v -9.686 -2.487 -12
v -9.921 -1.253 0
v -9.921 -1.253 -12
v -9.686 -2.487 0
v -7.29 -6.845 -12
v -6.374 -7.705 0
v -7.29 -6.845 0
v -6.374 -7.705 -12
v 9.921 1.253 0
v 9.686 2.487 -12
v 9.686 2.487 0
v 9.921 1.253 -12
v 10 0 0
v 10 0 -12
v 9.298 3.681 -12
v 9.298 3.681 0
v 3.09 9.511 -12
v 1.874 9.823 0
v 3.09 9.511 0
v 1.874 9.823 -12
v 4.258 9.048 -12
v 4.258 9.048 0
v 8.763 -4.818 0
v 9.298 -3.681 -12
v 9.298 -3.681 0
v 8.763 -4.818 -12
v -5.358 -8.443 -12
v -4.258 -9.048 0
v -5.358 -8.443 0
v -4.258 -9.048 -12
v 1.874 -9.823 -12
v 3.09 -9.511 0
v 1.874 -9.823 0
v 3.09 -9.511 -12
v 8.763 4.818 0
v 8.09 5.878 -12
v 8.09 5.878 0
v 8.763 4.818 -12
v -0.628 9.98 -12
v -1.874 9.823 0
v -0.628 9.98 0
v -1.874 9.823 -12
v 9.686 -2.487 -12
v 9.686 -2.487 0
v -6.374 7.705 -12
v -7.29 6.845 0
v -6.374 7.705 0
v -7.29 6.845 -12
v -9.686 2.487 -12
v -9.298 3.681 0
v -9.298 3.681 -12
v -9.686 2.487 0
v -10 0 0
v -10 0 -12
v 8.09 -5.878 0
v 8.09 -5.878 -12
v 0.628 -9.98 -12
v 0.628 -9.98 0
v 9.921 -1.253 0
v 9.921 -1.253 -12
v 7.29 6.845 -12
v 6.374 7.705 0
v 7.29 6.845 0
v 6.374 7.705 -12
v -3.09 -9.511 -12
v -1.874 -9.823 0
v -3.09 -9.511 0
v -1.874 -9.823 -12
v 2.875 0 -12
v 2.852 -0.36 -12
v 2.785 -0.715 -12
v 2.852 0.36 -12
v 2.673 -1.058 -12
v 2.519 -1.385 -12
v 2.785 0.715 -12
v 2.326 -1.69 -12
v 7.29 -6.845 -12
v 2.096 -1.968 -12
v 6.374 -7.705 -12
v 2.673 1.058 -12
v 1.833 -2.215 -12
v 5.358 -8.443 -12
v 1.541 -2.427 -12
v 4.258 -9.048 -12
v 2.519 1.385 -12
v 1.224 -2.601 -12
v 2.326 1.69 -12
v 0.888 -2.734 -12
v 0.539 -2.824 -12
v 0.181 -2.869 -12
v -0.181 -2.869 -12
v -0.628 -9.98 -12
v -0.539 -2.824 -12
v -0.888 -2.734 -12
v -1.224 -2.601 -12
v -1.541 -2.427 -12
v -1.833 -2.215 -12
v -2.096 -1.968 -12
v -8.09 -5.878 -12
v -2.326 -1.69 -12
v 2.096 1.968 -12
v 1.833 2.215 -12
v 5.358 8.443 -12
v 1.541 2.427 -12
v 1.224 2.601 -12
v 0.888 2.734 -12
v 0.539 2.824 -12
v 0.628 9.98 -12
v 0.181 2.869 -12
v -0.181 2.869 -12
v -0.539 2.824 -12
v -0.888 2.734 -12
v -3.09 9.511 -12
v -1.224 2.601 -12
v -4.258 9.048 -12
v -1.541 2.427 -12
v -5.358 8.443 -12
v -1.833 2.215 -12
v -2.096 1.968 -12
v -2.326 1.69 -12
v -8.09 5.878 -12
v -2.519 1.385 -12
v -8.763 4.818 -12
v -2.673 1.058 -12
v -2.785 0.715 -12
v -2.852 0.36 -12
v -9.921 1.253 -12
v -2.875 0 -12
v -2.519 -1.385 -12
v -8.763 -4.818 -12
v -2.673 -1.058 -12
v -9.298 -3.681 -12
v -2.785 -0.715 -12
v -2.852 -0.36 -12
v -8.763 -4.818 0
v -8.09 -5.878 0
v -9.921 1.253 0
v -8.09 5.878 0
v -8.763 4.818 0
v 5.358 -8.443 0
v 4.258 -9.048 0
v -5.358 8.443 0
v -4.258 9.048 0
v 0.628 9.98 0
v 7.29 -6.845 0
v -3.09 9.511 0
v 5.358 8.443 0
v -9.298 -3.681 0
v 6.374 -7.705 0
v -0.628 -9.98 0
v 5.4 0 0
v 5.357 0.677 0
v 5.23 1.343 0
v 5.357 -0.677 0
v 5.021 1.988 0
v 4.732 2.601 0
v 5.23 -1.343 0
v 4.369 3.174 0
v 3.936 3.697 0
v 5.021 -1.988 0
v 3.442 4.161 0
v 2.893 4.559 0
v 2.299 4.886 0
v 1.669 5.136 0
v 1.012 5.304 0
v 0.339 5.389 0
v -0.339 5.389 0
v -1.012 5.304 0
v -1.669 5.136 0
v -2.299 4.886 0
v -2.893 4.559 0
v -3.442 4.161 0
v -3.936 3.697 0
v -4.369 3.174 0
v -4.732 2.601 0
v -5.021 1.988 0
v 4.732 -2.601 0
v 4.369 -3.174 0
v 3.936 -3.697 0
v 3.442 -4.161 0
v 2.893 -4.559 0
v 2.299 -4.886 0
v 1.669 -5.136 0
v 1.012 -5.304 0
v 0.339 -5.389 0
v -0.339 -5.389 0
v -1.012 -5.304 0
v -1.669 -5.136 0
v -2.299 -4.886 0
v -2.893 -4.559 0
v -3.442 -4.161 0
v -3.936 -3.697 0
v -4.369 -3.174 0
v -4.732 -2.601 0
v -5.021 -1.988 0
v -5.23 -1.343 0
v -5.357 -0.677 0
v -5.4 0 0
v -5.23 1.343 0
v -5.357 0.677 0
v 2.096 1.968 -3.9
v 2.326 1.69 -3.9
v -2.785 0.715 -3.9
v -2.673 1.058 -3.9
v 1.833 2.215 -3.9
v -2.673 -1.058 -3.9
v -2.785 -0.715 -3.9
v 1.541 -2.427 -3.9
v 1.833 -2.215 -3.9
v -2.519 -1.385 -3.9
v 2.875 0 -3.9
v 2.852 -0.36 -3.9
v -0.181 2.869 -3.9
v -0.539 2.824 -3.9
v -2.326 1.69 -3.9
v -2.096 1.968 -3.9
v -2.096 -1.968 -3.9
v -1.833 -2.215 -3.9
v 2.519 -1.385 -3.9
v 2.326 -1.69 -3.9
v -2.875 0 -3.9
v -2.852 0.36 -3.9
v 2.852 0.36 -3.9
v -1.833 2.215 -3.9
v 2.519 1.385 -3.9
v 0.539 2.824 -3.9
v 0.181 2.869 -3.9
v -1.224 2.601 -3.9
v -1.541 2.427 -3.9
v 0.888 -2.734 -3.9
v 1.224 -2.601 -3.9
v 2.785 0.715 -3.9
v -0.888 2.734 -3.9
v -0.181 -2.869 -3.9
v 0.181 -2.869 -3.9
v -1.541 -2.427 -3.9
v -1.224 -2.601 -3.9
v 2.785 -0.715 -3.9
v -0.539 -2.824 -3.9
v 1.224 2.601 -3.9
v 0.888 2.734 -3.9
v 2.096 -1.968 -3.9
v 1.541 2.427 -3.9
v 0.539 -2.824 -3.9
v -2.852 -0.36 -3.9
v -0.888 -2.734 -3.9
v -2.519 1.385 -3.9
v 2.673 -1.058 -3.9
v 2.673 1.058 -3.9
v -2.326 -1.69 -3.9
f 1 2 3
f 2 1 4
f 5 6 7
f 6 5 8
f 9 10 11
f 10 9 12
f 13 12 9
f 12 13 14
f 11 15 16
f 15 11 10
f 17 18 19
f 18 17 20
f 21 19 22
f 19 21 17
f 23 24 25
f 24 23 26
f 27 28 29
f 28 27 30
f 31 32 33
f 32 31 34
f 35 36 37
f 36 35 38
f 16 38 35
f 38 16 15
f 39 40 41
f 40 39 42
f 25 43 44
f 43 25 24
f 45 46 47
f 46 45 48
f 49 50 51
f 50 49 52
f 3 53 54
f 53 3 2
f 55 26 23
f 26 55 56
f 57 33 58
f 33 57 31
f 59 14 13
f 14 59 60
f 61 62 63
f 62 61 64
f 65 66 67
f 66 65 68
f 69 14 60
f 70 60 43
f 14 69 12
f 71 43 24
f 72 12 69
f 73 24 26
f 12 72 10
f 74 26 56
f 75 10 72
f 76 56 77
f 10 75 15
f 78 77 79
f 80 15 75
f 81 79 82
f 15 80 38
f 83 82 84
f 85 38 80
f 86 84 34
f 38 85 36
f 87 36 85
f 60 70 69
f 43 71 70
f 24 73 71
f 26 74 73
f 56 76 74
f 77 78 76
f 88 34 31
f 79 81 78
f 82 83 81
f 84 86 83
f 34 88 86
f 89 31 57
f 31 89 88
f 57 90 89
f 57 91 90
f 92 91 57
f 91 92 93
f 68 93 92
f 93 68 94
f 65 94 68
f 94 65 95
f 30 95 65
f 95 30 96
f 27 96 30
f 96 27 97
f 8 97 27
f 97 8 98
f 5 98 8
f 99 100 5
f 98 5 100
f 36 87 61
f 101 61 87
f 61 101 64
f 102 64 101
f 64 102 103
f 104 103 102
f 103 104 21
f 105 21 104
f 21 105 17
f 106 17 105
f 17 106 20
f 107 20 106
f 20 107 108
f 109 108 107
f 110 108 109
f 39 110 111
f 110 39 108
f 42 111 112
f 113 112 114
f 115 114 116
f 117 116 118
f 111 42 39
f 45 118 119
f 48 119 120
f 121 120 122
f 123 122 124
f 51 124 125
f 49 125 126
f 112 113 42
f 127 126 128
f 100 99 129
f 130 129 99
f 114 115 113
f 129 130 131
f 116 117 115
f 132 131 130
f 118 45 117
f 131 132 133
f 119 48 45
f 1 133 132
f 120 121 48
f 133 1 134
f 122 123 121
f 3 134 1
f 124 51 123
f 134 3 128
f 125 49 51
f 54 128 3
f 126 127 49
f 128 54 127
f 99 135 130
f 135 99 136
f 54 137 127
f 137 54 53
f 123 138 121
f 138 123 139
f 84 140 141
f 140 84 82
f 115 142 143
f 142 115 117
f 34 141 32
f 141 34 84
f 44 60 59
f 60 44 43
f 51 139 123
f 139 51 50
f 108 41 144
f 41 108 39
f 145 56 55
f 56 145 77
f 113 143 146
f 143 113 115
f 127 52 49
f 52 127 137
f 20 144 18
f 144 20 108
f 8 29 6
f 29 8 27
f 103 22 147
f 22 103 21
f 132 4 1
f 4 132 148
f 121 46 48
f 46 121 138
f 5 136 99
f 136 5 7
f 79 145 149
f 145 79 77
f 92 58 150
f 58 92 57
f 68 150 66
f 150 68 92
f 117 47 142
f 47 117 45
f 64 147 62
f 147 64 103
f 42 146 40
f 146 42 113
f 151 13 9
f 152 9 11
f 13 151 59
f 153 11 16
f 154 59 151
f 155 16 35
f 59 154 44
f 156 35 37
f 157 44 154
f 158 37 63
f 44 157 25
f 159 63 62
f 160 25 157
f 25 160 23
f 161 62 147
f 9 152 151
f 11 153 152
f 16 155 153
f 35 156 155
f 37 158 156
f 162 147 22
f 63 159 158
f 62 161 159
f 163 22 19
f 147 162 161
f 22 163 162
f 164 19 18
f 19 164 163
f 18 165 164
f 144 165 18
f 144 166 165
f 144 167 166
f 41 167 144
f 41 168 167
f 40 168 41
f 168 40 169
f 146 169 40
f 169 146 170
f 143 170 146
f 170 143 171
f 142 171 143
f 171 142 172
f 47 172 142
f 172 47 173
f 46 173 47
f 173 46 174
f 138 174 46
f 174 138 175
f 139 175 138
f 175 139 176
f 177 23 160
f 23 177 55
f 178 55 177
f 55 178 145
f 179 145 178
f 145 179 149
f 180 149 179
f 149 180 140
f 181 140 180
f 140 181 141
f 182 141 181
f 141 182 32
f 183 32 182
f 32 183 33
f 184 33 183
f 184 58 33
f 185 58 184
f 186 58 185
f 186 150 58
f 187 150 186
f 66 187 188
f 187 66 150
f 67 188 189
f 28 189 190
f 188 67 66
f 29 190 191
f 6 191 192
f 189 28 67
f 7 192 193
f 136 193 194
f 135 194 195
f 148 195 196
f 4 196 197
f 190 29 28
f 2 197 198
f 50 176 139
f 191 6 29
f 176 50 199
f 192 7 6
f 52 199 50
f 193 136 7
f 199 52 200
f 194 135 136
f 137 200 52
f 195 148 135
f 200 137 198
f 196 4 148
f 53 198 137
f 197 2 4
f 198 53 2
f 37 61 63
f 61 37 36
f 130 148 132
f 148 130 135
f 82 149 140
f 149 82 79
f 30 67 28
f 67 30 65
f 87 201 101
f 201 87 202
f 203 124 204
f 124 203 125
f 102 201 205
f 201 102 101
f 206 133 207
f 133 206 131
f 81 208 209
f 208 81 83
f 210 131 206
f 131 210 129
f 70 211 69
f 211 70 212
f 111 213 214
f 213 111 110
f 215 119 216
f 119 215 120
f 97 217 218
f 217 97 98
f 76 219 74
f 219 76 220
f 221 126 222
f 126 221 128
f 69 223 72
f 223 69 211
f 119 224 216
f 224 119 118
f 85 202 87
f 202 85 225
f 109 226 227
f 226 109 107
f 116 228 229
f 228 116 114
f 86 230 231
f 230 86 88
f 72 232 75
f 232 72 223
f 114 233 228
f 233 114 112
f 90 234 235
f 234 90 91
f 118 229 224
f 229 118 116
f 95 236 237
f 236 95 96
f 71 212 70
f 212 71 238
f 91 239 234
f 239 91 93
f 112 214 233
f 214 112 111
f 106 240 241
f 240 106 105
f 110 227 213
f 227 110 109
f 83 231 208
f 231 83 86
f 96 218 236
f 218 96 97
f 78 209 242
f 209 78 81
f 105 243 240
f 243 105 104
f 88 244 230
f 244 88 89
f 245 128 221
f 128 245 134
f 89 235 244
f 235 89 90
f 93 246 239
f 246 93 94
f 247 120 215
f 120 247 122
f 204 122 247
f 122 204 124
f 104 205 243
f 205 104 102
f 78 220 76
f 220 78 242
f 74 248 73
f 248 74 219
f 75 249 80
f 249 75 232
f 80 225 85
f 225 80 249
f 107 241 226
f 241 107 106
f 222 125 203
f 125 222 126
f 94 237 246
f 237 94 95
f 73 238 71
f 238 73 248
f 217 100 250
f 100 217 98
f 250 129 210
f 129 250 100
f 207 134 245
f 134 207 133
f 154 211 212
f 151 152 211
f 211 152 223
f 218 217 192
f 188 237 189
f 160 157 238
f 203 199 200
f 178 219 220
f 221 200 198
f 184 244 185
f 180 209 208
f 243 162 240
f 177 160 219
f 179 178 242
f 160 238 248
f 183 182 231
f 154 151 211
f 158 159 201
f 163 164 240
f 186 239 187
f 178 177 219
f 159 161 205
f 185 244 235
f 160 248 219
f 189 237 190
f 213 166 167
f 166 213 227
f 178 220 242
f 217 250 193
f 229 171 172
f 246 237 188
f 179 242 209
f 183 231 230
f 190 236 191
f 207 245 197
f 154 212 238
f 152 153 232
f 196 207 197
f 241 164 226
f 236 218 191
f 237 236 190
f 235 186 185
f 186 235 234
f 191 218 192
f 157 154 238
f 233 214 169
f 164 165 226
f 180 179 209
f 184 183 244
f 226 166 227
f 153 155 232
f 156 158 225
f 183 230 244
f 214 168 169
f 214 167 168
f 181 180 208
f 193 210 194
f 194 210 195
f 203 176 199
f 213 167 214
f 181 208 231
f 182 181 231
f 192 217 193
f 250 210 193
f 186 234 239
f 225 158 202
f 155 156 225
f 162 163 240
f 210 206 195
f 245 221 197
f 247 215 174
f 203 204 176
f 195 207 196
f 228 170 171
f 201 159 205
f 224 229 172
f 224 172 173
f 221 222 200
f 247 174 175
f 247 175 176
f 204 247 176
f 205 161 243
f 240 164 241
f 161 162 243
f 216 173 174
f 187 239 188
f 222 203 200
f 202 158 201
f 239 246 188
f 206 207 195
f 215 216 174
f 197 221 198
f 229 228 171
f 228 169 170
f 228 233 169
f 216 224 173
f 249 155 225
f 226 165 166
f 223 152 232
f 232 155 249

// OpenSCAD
$fn = 50;

difference() {
	union() {
		translate(v = [0, 0, -12.0]) {
			cylinder(h = 12, r = 10.0);
		}
		#translate(v = [0, 0, -15.0]) {
			cylinder(h = 15, r = 2.875);
		}
	}
	union() {
		translate(v = [0, 0, 0]) {
			rotate(a = [0, 0, 0]) {
				difference() {
					union() {
						translate(v = [0, 0, -15.0]) {
							cylinder(h = 15, r = 2.6);
						}
						translate(v = [0, 0, -3.9]) {
							cylinder(h = 3.9, r1 = 2.875, r2 = 5.4);
						}
						translate(v = [0, 0, -15.0]) {
							cylinder(h = 15, r = 2.875);
						}
						translate(v = [0, 0, -15.0]) {
							cylinder(h = 15, r = 2.6);
						}
					}
					union();
				}
			}
		}
	}
}
